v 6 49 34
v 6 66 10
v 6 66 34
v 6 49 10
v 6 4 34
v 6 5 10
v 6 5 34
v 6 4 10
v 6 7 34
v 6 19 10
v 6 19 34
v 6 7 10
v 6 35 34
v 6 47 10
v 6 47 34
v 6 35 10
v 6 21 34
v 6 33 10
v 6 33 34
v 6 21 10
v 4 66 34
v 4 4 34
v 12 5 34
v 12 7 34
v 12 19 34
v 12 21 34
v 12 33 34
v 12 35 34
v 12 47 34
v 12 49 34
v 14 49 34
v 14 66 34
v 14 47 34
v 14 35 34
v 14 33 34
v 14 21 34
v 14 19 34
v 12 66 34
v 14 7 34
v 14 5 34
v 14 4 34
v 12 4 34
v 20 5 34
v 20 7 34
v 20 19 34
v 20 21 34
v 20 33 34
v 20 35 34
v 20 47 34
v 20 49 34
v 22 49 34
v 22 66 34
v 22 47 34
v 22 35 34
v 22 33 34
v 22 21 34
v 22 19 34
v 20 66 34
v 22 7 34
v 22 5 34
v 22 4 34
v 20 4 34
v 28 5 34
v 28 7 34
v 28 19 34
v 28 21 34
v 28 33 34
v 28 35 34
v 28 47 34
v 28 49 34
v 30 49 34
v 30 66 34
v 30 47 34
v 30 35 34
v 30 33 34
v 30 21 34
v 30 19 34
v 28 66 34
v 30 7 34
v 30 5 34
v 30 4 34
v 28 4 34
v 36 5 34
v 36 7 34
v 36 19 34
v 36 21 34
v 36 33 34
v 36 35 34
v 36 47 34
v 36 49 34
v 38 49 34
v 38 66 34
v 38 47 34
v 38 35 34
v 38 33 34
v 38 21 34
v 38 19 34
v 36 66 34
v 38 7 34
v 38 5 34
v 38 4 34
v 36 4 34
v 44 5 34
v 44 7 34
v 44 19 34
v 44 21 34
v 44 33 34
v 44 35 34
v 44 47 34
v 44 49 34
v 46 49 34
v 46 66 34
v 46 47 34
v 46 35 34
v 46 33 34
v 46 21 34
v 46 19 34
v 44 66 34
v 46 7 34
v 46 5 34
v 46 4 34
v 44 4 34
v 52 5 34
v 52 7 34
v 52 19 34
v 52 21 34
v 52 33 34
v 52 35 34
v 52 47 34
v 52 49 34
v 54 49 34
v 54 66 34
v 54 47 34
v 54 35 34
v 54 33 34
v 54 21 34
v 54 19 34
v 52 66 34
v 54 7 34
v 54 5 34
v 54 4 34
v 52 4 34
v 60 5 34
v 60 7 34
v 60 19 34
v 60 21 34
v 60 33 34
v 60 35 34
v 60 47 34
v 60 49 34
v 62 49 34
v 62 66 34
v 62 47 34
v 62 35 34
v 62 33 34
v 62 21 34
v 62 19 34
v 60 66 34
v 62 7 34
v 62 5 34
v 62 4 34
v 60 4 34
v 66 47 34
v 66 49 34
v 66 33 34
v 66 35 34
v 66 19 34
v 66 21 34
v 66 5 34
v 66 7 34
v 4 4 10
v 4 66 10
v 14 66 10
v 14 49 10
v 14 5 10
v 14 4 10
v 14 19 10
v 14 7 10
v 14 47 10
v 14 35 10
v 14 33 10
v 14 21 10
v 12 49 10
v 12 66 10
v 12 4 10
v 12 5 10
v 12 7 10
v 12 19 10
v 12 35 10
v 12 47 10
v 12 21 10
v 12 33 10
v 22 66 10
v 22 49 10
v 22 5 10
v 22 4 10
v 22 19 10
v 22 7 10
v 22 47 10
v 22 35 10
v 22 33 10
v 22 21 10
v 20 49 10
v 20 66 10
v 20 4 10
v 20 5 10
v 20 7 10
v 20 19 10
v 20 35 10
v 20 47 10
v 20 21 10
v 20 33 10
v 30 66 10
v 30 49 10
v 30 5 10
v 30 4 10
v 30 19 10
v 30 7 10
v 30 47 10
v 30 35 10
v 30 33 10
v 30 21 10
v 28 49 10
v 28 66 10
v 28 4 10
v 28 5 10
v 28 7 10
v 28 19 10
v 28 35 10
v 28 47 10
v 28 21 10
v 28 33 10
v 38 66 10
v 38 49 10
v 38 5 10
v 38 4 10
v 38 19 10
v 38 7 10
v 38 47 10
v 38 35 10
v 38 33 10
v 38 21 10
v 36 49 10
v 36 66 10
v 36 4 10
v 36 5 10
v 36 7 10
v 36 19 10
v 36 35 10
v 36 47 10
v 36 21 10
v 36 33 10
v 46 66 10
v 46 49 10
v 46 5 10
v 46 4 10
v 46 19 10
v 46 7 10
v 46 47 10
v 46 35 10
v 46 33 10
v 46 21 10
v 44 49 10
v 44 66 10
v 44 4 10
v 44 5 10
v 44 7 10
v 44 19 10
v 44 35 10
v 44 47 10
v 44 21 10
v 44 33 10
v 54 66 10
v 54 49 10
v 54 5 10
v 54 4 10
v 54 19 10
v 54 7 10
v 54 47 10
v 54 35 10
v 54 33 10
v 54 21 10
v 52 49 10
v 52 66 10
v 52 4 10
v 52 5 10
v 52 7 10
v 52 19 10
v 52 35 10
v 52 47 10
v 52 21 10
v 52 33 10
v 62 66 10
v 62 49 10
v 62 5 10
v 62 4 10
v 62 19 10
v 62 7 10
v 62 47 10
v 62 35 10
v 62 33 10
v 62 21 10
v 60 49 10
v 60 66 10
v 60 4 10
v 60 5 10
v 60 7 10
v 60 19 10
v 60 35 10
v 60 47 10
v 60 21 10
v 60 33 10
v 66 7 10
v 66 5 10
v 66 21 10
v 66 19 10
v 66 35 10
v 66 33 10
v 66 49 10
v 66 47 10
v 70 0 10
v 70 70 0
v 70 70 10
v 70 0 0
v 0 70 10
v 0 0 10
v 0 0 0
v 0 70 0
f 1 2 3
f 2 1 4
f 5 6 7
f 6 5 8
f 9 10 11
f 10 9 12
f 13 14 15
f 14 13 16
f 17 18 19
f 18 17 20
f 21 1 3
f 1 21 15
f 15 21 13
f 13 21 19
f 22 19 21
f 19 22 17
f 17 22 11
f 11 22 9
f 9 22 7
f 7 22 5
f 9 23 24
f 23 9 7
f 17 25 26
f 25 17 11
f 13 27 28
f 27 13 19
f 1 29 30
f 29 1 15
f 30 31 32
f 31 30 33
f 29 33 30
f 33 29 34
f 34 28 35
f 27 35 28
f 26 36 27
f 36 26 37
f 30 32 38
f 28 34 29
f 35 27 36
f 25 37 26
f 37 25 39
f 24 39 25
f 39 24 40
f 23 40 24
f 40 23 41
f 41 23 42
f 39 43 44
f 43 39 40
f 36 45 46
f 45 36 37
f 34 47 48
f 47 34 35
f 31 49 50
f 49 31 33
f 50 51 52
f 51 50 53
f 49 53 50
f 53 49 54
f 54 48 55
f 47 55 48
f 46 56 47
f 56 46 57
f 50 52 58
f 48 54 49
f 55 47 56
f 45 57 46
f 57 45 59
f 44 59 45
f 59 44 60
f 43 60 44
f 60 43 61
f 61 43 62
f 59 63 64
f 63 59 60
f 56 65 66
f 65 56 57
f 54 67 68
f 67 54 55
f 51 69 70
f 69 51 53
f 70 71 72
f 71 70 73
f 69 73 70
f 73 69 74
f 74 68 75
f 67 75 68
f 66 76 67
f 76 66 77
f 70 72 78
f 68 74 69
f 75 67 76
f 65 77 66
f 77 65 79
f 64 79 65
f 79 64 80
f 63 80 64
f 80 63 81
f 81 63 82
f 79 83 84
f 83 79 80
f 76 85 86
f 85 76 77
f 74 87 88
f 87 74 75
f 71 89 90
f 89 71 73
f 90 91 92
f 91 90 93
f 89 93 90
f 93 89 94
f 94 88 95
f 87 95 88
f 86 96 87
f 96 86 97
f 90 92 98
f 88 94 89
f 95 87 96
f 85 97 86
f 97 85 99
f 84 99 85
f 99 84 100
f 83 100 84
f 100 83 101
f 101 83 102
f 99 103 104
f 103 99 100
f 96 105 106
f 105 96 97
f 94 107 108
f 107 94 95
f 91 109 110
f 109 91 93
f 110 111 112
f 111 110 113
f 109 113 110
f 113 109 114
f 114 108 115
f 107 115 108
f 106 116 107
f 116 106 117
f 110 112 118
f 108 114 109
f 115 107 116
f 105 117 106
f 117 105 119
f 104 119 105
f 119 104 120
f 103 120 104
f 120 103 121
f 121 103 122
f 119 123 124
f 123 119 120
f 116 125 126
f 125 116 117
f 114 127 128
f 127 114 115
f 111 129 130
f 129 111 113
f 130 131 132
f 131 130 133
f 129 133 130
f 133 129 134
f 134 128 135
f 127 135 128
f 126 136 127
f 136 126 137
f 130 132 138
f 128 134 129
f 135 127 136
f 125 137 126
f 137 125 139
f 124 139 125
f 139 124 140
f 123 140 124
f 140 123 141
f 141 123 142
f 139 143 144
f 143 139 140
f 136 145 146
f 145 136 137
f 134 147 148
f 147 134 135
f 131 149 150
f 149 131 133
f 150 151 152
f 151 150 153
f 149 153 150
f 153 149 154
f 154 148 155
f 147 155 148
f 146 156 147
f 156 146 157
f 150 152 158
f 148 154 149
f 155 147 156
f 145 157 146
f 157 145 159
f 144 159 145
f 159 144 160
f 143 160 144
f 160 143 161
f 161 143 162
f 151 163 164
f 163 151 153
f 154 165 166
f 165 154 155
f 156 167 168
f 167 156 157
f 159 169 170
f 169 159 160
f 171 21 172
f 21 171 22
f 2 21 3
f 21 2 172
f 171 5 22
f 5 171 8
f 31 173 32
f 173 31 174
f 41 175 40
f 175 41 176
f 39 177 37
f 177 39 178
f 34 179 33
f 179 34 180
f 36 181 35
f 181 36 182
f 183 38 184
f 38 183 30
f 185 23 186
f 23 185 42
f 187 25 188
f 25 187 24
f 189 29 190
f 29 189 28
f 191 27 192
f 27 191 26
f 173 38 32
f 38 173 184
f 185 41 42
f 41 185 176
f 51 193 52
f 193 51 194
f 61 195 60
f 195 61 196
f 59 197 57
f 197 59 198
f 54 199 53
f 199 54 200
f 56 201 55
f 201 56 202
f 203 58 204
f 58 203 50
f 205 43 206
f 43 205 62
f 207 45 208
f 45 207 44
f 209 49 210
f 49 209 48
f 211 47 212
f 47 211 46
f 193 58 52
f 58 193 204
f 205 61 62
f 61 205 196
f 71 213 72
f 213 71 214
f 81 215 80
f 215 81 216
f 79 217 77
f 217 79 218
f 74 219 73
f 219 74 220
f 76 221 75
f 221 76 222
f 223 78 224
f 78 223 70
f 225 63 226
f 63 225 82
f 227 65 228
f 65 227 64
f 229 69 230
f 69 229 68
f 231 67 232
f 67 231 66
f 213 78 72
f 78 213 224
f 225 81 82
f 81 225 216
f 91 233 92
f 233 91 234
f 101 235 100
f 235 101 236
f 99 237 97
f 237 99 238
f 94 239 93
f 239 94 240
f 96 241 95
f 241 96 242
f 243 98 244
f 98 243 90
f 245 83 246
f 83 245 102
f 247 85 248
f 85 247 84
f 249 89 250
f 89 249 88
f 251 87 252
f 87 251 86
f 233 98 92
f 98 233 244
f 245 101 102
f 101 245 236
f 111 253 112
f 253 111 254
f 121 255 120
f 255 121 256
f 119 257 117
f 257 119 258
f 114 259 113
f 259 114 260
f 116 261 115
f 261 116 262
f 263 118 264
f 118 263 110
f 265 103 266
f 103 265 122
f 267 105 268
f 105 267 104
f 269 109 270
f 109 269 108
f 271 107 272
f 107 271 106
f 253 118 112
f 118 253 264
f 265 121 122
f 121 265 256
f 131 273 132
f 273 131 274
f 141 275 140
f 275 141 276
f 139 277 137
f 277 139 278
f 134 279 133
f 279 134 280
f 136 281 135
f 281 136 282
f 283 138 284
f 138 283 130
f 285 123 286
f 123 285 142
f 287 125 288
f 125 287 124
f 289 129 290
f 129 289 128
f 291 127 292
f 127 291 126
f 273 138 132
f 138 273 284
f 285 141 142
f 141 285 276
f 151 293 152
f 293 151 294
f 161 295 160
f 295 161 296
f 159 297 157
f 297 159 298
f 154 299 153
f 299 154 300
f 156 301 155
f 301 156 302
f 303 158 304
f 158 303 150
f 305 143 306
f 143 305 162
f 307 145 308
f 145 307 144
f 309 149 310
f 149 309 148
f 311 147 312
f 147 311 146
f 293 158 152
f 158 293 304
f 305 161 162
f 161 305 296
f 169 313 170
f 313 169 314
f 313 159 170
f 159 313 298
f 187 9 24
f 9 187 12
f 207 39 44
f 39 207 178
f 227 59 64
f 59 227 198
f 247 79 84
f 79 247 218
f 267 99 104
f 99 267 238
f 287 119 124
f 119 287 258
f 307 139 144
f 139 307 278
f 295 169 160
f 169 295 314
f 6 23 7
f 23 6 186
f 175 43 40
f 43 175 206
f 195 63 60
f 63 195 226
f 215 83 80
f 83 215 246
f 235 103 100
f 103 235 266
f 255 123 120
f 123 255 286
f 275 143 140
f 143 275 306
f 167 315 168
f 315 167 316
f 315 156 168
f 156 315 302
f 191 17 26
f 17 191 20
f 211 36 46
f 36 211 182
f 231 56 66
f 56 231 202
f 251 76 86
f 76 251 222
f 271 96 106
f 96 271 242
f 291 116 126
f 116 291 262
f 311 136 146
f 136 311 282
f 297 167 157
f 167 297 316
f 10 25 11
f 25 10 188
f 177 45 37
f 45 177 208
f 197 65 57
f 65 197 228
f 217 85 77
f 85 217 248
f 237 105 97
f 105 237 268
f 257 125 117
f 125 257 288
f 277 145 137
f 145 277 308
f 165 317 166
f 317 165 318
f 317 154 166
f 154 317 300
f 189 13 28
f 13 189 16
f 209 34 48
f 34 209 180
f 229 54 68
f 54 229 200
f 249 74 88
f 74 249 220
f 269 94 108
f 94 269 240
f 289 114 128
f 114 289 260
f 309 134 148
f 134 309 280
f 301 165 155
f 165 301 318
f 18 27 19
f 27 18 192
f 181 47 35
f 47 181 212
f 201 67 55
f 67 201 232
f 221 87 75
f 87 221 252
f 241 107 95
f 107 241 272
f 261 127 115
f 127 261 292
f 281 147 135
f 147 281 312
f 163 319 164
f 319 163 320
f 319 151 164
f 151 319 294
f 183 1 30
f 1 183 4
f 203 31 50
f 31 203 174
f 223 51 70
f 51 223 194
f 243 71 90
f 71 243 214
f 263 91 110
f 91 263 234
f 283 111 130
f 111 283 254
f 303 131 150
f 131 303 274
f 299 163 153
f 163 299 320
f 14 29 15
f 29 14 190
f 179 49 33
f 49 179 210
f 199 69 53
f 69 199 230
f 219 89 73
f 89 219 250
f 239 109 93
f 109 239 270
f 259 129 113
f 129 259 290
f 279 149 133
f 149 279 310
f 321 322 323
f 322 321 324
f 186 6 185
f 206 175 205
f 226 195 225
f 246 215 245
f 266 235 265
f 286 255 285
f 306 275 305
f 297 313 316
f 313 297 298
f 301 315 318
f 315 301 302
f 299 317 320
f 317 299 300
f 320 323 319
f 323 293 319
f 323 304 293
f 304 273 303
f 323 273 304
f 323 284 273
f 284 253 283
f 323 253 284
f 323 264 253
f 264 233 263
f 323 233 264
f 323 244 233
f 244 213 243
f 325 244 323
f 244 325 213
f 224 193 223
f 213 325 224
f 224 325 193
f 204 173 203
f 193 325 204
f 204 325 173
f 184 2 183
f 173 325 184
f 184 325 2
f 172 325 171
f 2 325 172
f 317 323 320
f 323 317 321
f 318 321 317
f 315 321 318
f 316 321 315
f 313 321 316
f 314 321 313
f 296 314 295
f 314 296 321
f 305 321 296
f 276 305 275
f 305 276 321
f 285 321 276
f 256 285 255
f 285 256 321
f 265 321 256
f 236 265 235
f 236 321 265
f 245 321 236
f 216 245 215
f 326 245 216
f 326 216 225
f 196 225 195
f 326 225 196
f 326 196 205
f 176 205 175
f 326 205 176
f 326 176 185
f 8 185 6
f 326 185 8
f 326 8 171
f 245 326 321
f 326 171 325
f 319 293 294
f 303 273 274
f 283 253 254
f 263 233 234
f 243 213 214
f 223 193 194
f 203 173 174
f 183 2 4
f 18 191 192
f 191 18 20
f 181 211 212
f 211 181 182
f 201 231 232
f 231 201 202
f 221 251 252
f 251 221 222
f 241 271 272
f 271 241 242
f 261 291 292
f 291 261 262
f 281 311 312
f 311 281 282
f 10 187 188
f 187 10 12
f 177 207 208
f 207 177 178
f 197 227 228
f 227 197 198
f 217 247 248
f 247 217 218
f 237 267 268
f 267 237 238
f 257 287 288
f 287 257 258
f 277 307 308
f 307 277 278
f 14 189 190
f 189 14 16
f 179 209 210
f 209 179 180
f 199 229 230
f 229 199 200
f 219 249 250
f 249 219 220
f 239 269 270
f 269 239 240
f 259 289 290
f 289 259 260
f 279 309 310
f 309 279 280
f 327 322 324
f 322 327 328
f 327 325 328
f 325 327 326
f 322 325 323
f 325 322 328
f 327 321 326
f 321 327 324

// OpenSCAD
$fn = 32;

// ----------------------------------------------------------------------
// Heatsink: cross fin block
// ----------------------------------------------------------------------

// --- parameters (mm) ---
base_l = 70;              // base length, X
base_w = 70;              // base width, Y
base_t = 10;              // base plate thickness
fin_h = 25;               // fin height above the base
fin_t = 2;                // fin thickness
edge = 4;                 // margin from the base ends
pitch = 8;                // fin pitch
rib_pitch = 14;           // cross rib pitch

n_fins = floor((base_l - 2 * edge - fin_t) / pitch) + 1;  // fin count
total_h = base_t + fin_h - 1;  // overall height
n_ribs = floor((base_w - 2 * edge) / rib_pitch);  // rib count

union() {
  cube([base_l, base_w, base_t]);
  for (i = [0 : n_fins - 1])
    translate([edge + i * pitch, edge, base_t - 1])
      cube([fin_t, base_w - 2 * edge, fin_h]);
  for (i = [0 : n_ribs - 1])
    translate([edge, edge + 1 + i * rib_pitch, base_t - 1])
      cube([base_l - 2 * edge, fin_t, fin_h]);
}
